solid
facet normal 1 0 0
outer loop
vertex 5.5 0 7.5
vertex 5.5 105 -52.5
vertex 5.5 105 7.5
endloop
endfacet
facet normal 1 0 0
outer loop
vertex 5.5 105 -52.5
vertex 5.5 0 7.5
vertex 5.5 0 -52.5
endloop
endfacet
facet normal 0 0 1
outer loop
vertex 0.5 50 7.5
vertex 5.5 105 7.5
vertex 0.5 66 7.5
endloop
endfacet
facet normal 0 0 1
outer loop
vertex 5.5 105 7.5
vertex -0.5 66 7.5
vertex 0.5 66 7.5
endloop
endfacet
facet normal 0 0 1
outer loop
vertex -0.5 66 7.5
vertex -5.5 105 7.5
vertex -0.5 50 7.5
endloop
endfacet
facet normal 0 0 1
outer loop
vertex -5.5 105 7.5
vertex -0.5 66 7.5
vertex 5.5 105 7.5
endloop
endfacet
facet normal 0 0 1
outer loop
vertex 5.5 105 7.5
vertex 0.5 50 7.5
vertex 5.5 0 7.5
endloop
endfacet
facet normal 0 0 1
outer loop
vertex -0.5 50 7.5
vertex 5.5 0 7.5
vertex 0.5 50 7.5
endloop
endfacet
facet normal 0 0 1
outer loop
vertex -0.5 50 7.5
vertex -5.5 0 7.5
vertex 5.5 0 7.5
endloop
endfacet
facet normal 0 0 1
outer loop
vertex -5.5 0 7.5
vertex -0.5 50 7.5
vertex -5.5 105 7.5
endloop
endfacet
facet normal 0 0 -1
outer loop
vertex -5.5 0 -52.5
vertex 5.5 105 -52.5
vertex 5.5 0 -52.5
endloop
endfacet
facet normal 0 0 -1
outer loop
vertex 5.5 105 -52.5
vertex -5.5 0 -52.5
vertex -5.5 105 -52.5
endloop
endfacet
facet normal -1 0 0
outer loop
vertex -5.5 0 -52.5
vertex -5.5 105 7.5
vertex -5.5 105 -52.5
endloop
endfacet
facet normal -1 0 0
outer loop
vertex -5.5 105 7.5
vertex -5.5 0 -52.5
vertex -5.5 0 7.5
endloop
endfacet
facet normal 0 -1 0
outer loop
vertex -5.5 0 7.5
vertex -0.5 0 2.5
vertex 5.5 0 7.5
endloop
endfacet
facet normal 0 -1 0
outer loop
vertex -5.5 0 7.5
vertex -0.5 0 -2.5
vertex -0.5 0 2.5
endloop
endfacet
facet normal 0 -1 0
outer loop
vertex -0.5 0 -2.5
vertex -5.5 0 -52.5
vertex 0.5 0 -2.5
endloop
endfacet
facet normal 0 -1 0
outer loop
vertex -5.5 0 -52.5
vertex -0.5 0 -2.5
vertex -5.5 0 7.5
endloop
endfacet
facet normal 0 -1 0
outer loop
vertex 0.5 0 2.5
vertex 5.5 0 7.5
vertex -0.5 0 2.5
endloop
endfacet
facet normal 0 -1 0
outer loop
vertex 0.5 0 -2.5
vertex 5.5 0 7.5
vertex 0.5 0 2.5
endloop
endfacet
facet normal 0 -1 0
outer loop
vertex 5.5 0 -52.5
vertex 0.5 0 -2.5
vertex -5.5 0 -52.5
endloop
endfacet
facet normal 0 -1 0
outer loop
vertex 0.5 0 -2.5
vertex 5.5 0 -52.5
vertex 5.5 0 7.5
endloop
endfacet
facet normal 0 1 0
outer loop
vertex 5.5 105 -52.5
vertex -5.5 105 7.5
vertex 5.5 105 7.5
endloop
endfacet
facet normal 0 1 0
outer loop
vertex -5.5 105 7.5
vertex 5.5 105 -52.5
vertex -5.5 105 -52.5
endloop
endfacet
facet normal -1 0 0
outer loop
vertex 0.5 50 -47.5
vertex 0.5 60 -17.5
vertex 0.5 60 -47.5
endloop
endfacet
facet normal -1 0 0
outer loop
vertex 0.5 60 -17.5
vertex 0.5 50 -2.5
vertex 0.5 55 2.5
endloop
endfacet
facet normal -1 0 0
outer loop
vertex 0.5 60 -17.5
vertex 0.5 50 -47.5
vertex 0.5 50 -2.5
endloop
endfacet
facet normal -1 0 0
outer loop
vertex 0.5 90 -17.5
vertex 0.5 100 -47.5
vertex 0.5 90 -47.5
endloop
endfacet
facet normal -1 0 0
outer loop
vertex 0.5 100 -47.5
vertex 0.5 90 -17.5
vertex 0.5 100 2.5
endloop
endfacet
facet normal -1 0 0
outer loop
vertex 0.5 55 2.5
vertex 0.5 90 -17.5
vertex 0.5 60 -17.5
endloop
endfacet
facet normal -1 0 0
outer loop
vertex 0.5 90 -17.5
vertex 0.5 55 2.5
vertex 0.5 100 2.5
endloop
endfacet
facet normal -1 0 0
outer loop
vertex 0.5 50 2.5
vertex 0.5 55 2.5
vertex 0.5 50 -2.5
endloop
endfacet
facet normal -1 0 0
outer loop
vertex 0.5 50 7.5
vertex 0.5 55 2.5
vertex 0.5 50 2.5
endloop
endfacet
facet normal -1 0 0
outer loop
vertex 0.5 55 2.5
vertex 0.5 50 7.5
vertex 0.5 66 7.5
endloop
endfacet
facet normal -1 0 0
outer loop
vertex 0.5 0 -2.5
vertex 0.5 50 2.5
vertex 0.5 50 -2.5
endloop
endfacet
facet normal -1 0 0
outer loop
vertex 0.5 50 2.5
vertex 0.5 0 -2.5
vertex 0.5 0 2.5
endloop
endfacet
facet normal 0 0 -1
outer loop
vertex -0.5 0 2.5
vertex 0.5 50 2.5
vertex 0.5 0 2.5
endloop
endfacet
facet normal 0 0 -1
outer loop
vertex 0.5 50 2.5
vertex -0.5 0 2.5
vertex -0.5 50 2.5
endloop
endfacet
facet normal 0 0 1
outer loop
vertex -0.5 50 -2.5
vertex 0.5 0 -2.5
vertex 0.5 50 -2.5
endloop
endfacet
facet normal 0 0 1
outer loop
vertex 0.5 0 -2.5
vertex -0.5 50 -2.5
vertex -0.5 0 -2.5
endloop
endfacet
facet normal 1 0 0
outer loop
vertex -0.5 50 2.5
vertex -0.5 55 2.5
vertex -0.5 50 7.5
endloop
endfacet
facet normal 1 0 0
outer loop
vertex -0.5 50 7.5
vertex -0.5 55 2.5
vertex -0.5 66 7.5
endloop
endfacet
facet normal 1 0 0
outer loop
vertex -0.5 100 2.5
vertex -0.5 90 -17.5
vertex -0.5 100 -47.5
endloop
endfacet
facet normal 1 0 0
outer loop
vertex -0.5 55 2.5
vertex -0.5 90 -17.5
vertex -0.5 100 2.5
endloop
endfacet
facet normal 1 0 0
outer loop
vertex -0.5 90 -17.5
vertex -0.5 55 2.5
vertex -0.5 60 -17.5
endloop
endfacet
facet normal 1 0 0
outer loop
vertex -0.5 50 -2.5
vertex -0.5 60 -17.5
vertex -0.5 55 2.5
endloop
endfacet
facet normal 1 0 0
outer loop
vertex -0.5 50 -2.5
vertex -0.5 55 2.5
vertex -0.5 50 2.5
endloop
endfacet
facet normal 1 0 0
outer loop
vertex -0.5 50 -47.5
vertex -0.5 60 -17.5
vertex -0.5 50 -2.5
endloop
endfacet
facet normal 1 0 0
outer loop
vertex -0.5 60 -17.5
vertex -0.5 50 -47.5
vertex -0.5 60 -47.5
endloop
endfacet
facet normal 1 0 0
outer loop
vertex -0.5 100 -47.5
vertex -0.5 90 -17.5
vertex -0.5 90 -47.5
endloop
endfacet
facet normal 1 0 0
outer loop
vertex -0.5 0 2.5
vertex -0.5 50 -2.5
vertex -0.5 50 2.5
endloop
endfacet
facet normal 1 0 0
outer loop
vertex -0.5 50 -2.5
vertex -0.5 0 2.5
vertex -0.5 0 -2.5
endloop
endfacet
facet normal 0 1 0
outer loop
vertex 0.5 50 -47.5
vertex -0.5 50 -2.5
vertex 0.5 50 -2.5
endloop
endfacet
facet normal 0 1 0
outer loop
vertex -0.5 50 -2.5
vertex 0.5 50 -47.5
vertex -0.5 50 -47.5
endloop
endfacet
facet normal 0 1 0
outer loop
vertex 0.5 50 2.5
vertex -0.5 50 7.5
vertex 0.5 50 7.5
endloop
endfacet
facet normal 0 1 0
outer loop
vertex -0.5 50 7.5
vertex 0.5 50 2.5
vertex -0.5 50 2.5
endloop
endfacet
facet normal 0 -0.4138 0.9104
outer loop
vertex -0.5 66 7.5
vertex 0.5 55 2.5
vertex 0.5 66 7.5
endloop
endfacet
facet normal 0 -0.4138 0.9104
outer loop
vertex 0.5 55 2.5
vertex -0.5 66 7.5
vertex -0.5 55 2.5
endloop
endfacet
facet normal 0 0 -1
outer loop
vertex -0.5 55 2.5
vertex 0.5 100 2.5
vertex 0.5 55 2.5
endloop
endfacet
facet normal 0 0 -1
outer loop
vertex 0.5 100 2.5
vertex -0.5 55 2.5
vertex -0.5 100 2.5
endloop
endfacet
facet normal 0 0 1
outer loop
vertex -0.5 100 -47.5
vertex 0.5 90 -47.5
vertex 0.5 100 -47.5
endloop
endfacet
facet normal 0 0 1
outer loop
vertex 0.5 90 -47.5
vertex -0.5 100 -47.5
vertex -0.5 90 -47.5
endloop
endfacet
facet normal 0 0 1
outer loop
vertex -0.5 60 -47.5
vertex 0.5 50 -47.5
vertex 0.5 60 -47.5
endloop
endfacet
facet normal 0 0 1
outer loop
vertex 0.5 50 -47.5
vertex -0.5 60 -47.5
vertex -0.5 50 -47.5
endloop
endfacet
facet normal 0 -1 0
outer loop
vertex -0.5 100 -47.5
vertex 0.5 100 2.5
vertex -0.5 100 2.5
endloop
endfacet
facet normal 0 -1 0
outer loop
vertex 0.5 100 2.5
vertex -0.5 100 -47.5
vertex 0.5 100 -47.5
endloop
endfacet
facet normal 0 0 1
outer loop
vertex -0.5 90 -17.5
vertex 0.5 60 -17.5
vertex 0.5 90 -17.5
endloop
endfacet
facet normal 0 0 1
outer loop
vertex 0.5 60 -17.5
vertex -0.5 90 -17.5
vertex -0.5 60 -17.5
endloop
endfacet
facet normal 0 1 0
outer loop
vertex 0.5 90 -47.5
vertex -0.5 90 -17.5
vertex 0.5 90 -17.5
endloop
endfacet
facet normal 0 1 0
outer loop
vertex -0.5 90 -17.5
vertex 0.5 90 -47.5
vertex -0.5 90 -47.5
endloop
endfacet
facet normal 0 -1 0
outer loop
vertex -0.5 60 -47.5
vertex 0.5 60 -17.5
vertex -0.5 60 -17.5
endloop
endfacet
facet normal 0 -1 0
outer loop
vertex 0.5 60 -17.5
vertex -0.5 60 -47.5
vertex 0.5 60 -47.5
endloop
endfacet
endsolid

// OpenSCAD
// Baseline CAD geometry, with all dimensions in millimetres; +Y follows the throat and +Z is up.
// Positive modules describe air/cutting volumes; skin modules describe outer material.
// solidBody subtracts the former from the latter. The thin spawn cube spans Y=-1 to 0,
// so the generator can retain its Y=0 face and construct the inlet boundary rectangle.
// The final two calls display BOTH objects. Export each module separately as ASCII STL
// using the wrapper procedure in README; exporting this complete scene combines them.

skinThickness = 5;

throatWidth = 1;
throatLength = 50;
throatHeight = 5;

voicingHoleWidth = 1;
voicingHoleLength = 5;
voicingHoleHeight = skinThickness;
voicingHoleX = -voicingHoleWidth / 2;
voicingHoleY = throatLength;
voicingHoleZ = throatHeight / 2;

voicingEdgeLength = 10;

pressureChamberWidth = 1;
pressureChamberLength = 50;
pressureChamberHeight = 50;
pressureChamberX = -pressureChamberWidth / 2;
pressureChamberY = throatLength;
pressureChamberZ = -pressureChamberHeight + throatHeight / 2;

chamberFillerLength = 30;
chamberFillerHeight = 30;


module throatPositive() {
    translate([-throatWidth / 2, -1, -throatHeight / 2])
    cube([throatWidth, throatLength + 2, throatHeight]);
}

module throatSkin() {
    translate([-(pressureChamberWidth + skinThickness * 2) / 2, 0, pressureChamberZ - skinThickness])
    cube([pressureChamberWidth + skinThickness * 2, throatLength - 1, pressureChamberHeight + skinThickness * 2]);
}

module voicingHolePositive() {
    translate([voicingHoleX, voicingHoleY, voicingHoleZ - 1])
    cube([voicingHoleWidth, voicingHoleLength, voicingHoleHeight + 2]);
}

module voicingEdgePositive() {
    translate([voicingHoleWidth / 2, voicingHoleY + voicingHoleLength - 0.00001, throatHeight / 2])
    rotate([0, -90, 0])
    linear_extrude(height = voicingHoleWidth)
    polygon([
        [0, 0],
        [skinThickness + 0.00001, 0],
        [skinThickness + 0.00001, voicingEdgeLength + 1]
    ]);
}

module pressureChamberPositive() {
    translate([pressureChamberX, pressureChamberY, pressureChamberZ])
    cube([pressureChamberWidth, pressureChamberLength, pressureChamberHeight]);
}

module pressureChamberSkin() {
    translate([pressureChamberX - skinThickness, pressureChamberY - skinThickness, pressureChamberZ - skinThickness])
    cube([pressureChamberWidth + skinThickness * 2, pressureChamberLength + skinThickness * 2, pressureChamberHeight + skinThickness * 2]);
}

module positiveGroup() {
    union() {
        throatPositive();
        voicingHolePositive();
        voicingEdgePositive();
        pressureChamberPositive();
    }
}

module skinGroup() {
    union() {
        throatSkin();
        pressureChamberSkin();
    }
}

module solidBody() {
    difference() {
        skinGroup();
        positiveGroup();
    }
    
    translate([pressureChamberX - skinThickness, pressureChamberY + pressureChamberLength / 2 - chamberFillerLength / 2, pressureChamberZ])
    cube([pressureChamberWidth + skinThickness * 2, chamberFillerLength, chamberFillerHeight]);
    
}

module spawnPlane() {
    translate([-throatWidth / 2, -1, -throatHeight / 2])
    cube([throatWidth, 1, throatHeight]);
}

difference() {
solidBody();
//translate([0, -500, -500]) cube([1000, 1000, 1000]);
}
*spawnPlane();
